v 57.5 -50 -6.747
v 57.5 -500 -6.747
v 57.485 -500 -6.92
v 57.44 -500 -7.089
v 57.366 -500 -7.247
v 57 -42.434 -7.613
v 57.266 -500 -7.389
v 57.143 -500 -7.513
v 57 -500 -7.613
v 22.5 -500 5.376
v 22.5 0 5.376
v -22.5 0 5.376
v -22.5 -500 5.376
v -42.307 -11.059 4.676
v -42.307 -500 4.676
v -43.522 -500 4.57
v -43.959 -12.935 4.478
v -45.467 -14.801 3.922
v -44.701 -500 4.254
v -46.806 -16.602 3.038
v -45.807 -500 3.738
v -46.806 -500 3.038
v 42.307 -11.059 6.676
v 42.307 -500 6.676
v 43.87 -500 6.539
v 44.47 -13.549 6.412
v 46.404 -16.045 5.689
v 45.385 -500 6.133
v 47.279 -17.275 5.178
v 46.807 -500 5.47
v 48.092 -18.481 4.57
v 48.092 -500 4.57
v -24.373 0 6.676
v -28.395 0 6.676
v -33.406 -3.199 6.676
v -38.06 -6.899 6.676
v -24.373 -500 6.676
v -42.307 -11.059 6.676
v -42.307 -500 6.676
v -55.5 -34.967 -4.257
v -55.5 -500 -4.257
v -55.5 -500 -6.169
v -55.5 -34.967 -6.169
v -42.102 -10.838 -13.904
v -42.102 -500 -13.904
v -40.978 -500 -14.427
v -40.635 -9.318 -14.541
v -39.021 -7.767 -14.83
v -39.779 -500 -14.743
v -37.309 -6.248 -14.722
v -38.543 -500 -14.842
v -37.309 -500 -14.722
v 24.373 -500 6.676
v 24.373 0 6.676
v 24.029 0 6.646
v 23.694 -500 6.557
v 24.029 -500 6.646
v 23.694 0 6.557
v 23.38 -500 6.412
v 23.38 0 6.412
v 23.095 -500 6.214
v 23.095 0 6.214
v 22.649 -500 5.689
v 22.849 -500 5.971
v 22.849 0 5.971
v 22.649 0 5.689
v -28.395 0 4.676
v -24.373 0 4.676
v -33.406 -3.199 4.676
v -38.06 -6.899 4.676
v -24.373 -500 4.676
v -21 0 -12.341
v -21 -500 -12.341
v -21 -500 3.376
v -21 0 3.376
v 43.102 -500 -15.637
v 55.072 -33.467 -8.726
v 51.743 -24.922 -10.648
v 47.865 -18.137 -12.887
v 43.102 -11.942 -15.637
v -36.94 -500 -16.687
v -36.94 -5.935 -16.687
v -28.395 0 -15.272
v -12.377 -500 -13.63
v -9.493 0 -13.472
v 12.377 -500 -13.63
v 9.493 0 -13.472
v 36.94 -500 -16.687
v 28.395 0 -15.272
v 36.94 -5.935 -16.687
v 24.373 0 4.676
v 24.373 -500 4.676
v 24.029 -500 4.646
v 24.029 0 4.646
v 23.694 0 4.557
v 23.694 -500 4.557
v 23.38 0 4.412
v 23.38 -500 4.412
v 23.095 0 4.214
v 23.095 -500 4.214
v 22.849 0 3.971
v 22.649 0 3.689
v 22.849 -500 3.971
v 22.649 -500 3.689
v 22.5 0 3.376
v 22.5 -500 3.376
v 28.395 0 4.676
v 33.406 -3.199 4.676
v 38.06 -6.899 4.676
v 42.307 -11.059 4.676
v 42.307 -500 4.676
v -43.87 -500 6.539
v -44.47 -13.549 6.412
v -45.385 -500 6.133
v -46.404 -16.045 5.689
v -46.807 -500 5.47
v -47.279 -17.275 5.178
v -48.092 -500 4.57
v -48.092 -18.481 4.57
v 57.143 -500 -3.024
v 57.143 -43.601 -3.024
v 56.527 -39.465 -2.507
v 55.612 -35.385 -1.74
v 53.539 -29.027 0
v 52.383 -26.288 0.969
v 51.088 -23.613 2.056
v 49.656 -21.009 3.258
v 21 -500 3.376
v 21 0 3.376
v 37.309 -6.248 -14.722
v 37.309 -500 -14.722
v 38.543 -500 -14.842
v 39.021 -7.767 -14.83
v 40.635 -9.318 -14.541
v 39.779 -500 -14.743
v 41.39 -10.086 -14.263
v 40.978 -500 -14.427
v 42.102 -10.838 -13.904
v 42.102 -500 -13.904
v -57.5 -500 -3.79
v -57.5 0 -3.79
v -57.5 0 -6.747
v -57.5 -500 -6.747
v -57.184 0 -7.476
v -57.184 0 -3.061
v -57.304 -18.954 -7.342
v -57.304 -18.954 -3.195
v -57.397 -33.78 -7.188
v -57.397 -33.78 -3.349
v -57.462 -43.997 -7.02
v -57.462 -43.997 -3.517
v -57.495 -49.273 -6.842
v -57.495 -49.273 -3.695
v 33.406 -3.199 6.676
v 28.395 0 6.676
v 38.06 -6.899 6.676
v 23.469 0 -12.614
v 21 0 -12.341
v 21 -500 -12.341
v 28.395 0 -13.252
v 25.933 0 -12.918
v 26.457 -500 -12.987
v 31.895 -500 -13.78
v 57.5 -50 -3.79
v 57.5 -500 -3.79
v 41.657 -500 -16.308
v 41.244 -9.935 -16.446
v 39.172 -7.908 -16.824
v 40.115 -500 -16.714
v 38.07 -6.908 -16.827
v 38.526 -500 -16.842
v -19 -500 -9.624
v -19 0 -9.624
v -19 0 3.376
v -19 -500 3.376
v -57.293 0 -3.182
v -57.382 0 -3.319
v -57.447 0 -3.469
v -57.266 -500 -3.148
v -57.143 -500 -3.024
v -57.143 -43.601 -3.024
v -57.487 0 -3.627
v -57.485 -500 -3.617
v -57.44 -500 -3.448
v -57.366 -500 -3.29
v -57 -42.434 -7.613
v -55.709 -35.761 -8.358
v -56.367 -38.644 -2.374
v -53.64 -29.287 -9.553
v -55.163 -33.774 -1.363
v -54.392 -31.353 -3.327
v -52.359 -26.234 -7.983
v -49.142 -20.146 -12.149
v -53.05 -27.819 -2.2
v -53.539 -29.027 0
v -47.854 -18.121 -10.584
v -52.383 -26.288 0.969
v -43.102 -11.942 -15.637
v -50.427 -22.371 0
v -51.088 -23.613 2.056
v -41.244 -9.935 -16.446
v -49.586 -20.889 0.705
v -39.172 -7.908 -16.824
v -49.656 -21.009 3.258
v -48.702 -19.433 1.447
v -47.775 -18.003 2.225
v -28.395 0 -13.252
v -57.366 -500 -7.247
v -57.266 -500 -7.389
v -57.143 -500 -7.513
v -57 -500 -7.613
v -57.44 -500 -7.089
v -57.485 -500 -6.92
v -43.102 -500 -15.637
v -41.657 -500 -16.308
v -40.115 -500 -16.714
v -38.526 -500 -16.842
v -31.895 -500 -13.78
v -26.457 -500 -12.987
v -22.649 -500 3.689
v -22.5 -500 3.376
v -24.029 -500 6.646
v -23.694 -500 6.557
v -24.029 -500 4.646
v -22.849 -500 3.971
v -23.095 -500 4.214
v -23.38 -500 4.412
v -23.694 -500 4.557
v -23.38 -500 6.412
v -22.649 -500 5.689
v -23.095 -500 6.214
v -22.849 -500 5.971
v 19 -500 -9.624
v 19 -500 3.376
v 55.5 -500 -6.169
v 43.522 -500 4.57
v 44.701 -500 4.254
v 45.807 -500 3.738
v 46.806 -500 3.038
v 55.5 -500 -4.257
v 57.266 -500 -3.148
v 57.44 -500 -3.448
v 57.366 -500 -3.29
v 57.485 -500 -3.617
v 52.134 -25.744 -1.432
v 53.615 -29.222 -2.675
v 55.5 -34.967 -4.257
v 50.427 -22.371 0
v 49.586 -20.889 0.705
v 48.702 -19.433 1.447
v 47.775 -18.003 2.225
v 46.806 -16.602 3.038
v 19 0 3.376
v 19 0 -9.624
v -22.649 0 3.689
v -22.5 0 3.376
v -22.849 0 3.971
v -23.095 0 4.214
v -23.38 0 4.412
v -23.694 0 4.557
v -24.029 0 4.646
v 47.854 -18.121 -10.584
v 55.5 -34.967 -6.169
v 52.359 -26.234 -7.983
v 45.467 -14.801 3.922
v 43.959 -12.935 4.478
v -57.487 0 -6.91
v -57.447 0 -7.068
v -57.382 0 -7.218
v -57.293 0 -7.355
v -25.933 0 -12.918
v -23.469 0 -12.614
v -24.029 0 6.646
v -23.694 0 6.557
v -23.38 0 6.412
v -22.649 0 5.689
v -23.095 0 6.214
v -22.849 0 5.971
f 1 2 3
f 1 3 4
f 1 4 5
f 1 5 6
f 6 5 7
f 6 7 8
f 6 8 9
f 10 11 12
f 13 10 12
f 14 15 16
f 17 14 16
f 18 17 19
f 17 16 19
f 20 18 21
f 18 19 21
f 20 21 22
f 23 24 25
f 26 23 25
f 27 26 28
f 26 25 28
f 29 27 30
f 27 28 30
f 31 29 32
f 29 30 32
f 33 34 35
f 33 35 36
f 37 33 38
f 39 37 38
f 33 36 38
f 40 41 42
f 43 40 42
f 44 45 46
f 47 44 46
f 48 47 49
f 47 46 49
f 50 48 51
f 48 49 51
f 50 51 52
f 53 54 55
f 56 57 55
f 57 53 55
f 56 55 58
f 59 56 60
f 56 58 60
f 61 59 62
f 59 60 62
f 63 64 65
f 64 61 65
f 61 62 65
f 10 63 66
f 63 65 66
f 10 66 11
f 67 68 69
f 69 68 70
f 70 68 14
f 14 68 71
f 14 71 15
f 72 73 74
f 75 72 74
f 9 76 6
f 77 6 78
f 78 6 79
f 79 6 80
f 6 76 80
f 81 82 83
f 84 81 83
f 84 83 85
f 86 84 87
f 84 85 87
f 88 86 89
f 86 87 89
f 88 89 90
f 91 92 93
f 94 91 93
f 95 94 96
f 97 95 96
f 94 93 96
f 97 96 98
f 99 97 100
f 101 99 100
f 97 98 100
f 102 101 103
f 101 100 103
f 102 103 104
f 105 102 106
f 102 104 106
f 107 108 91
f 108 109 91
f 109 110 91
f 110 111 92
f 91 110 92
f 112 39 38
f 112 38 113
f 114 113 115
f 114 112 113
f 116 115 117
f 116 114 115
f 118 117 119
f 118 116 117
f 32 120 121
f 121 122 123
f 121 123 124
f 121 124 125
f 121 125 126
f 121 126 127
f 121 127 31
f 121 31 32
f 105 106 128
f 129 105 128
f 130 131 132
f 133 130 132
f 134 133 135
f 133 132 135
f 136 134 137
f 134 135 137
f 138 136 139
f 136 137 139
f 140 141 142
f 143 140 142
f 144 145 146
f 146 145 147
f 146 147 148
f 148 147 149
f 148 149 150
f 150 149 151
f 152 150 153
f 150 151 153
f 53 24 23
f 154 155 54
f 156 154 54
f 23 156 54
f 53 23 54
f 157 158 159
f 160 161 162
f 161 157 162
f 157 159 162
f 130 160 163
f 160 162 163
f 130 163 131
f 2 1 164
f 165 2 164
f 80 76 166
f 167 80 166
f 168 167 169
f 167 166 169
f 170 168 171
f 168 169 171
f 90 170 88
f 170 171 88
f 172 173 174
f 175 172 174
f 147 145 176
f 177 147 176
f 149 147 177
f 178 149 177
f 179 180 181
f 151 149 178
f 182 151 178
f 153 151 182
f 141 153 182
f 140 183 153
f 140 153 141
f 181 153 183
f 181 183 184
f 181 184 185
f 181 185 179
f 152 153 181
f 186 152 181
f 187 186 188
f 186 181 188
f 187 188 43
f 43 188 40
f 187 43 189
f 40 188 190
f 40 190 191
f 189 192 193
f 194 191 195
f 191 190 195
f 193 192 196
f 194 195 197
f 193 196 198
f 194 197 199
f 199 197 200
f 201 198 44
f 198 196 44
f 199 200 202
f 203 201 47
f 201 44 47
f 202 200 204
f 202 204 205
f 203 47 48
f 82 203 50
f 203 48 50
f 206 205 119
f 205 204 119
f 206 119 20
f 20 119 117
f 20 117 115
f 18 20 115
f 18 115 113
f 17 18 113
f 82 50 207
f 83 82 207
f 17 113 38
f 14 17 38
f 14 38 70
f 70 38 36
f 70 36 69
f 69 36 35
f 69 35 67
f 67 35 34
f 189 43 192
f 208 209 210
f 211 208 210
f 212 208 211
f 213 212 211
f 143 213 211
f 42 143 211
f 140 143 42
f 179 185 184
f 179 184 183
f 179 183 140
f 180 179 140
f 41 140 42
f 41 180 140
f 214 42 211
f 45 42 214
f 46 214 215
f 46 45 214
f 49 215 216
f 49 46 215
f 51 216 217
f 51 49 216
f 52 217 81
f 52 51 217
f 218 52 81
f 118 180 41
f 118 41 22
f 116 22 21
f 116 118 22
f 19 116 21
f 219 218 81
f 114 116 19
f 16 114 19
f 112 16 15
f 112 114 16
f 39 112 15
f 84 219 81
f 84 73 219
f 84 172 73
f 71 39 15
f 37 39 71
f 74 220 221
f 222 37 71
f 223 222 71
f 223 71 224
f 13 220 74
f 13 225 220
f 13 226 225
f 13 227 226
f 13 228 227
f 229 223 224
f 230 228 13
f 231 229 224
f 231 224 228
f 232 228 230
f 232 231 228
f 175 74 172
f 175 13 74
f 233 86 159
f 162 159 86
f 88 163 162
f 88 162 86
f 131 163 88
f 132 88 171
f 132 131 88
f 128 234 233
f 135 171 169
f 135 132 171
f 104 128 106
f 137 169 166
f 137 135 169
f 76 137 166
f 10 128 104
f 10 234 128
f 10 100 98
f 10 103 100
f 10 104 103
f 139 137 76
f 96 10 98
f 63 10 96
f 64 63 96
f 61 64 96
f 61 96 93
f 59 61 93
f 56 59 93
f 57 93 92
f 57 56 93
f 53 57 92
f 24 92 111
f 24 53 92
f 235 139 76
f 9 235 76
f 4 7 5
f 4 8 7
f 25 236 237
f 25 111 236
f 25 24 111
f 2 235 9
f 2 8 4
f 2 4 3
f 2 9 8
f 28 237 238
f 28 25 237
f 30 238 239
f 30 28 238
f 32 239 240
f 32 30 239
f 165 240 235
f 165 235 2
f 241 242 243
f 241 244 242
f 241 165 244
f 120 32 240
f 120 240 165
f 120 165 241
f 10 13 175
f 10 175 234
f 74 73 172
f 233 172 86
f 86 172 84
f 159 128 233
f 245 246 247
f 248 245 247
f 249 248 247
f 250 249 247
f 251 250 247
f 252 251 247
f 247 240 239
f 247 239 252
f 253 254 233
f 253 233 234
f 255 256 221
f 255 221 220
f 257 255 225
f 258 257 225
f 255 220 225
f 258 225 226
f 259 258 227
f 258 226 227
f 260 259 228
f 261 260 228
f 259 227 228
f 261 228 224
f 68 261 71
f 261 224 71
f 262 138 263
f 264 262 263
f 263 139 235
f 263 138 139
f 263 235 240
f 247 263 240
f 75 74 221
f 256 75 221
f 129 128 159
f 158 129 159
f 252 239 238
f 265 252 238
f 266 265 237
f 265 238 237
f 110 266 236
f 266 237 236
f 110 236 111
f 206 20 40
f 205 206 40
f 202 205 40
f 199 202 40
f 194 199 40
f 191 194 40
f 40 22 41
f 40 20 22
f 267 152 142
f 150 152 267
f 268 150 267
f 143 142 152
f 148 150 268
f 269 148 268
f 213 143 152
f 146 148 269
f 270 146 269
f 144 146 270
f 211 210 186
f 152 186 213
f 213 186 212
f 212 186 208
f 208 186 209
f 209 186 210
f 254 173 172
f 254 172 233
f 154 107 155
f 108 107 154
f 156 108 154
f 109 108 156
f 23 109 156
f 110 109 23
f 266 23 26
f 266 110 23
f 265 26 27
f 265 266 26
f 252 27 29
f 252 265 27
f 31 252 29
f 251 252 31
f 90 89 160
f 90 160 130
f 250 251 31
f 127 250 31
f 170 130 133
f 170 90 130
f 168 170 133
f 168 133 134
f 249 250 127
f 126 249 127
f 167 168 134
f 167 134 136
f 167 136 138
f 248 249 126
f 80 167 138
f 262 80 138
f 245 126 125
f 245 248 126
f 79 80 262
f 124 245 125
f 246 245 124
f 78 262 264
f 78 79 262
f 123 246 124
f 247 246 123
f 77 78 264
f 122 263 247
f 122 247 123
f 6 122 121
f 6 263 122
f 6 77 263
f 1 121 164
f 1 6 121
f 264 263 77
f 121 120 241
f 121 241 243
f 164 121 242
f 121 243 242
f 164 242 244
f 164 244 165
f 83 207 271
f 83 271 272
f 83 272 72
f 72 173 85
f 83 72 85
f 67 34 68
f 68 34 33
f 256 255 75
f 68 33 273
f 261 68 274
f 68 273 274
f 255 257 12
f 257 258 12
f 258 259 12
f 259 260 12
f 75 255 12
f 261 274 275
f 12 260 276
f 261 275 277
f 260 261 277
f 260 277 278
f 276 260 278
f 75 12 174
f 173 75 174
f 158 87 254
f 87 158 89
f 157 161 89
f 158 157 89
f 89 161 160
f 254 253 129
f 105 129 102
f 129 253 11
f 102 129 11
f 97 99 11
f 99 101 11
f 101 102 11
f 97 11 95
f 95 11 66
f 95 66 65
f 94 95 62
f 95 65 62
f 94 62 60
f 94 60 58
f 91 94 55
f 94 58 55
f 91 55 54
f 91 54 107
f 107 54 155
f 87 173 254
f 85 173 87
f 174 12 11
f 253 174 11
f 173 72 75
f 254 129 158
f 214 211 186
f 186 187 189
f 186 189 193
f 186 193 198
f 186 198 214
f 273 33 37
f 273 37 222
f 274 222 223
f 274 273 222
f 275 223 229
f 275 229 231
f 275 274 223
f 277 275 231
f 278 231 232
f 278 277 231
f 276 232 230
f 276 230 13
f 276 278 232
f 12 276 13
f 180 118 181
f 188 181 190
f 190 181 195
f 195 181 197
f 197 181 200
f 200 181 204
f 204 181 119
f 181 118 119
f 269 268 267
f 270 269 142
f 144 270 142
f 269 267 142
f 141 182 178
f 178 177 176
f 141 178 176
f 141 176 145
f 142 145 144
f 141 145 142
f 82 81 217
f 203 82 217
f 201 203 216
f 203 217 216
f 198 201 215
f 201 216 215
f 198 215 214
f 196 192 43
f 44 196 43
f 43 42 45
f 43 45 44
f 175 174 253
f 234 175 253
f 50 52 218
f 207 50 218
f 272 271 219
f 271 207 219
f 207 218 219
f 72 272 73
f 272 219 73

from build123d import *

# Parameters (mm, degrees)
F2_DEPTH       = 500
F1_W           = 38
F1_H           = 13
F3_DEPTH       = 600
F4_T1_DEPTH    = 509.3674969976
F5_R           = 9
F6_R           = 1
F8_DEPTH       = 500.001
F10_DEPTH      = 16.8433111076
F10_DEPTH_BACK = 25


# Not quite as in the source:
# - a fillet or chamfer that OpenCascade refuses, or shapes differently, is made with other operations: its cross-section is extruded or revolved along the edge and cut away or added
# - ends of sketch curves that miss each other by under 0.0002 mm in the source are joined


with BuildPart() as f2:
    # F0 (on Front) → F2 (new body)
    with BuildSketch(Plane.XZ):
        with BuildLine():
            Line((22.5, 5.3759940737), (0, 5.3759940737))
            Line((0, 5.3759940737), (-22.5, 5.3759940737))
            Line((-22.5, 5.3759940737), (-22.5, 6.6759940737))
            Line((-22.5, 6.6759940737), (-45.5824640741, 6.6759940737))
            Line((-45.5824640741, 6.6759940737), (-57.5, -3.3240059263))
            Line((-57.5, -3.3240059263), (-57.5, -7.3240059263))
            Line((-57.5, -7.3240059263), (-40.1794919243, -17.3240059263))
            ThreePointArc((-40.1794919243, -17.3240059263), (0, -13.2464610679), (40.1794919243, -17.3240059263))
            Line((40.1794919243, -17.3240059263), (57.5, -7.3240059263))
            Line((57.5, -7.3240059263), (57.5, -3.3240059263))
            Line((57.5, -3.3240059263), (45.5824640741, 6.6759940737))
            Line((45.5824640741, 6.6759940737), (22.5, 6.6759940737))
            Line((22.5, 6.6759940737), (22.5, 5.3759940737))
        make_face()
    extrude(amount=F2_DEPTH)

    # F1 (on face) → F3 (cut)
    with BuildSketch(Plane.XZ):
        with Locations((0, -3.1240059263)):
            Rectangle(F1_W, F1_H)
    extrude(amount=F3_DEPTH, mode=Mode.SUBTRACT)

    # F4: fillet of radius 2 on 2 edges, made by hand

    # F4_s2 → F4_t1 (cut)
    with BuildSketch(Plane.XZ.offset(-4.6837484988)):
        with BuildLine():
            ThreePointArc((-24.3734993995, 6.6759940737), (-23.2333239744, 6.3191617462), (-22.5, 5.3759940737))
            Line((-22.5, 5.3759940737), (-22.5, 6.6759940737))
            Line((-22.5, 6.6759940737), (-24.3734993995, 6.6759940737))
        make_face()
        with BuildLine():
            ThreePointArc((24.3734993995, 6.6759940737), (23.2333239744, 6.3191617462), (22.5, 5.3759940737))
            Line((22.5, 5.3759940737), (22.5, 6.6759940737))
            Line((22.5, 6.6759940737), (24.3734993995, 6.6759940737))
        make_face()
    extrude(amount=F4_T1_DEPTH, mode=Mode.SUBTRACT)

    # F5
    f5_edges = [f2.edges().sort_by_distance(p)[0] for p in [
        (-45.582464, -250, 6.675994),
        (-40.179492, -250, -17.324006),
        (40.179492, -250, -17.324006),
        (45.582464, -250, 6.675994),
    ]]
    fillet(f5_edges, radius=F5_R)

    # F6
    f6_edges = [f2.edges().sort_by_distance(p)[0] for p in [
        (57.5, -250, -3.324006),
        (57.5, -250, -7.324006),
        (-57.5, -250, -7.324006),
        (-57.5, -250, -3.324006),
    ]]
    fillet(f6_edges, radius=F6_R)

    # F7 (on face) → F8 (cut, through all)
    with BuildSketch(Plane.XZ.offset(500)):
        with BuildLine():
            ThreePointArc((-42.1022688854, -13.9044885758), (-39.7790672738, -14.7426835793), (-37.3093702039, -14.7218755322))
            ThreePointArc((-37.3093702039, -14.7218755322), (-29.1789784784, -13.3650277579), (-20.9999997169, -12.3410102235))
            Line((-20.9999997169, -12.3410102235), (-20.9999997169, 3.3759940737))
            Line((-20.9999997169, 3.3759940737), (-22.5, 3.3759940737))
            ThreePointArc((-22.5, 3.3759940737), (-23.2333240923, 4.3191614627), (-24.3734993995, 4.67599366))
            Line((-24.3734993995, 4.67599366), (-42.3067319657, 4.67599366))
            ThreePointArc((-42.3067319657, 4.67599366), (-44.7008728275, 4.2538420304), (-46.8062449676, 3.0383048586))
            Line((-46.8062449676, 3.0383048586), (-55.4999995863, -4.2566214356))
            Line((-55.4999995863, -4.2566214356), (-55.4999995863, -6.1693051491))
            Line((-55.4999995863, -6.1693051491), (-42.1022688854, -13.9044885758))
        make_face()
        with BuildLine():
            Line((20.9999997169, 3.3759940737), (20.9999997169, -12.3410102235))
            ThreePointArc((20.9999997169, -12.3410102235), (29.1789784784, -13.3650277579), (37.3093702039, -14.7218755322))
            ThreePointArc((37.3093702039, -14.7218755322), (39.7790673581, -14.7426840737), (42.1022691362, -13.9044890102))
            Line((42.1022691362, -13.9044890102), (55.5000000879, -6.1693054387))
            Line((55.5000000879, -6.1693054387), (55.5000000879, -4.2566212017))
            Line((55.5000000879, -4.2566212017), (46.8062452899, 3.0383052428))
            ThreePointArc((46.8062452899, 3.0383052428), (44.700872999, 4.2538425017), (42.3067319657, 4.6759941615))
            Line((42.3067319657, 4.6759941615), (24.3734993995, 4.6759941615))
            ThreePointArc((24.3734993995, 4.6759941615), (23.2333239494, 4.3191618064), (22.5, 3.3759940737))
            Line((22.5, 3.3759940737), (20.9999997169, 3.3759940737))
        make_face()
    extrude(amount=-F8_DEPTH, mode=Mode.SUBTRACT)

    # F9 (on Top) → F10 (cut, two sides)
    with BuildSketch(Plane.XY) as f10_sk:
        with BuildLine():
            ThreePointArc((-57.495400138, -49.2727015938), (0.3636564761, 7.498850023), (57.5, -50))
            Line((57.5, -50), (57.8162293472, 0))
            Line((57.8162293472, 0), (57.8162293472, 30))
            Line((57.8162293472, 30), (-57.1837706528, 30))
            Line((-57.1837706528, 30), (-57.1837706528, 0))
            Line((-57.1837706528, 0), (-57.495400138, -49.2727015938))
        make_face()
    extrude(amount=-F10_DEPTH, mode=Mode.SUBTRACT)
    extrude(f10_sk.sketch, amount=F10_DEPTH_BACK, mode=Mode.SUBTRACT)


solid = f2.part
